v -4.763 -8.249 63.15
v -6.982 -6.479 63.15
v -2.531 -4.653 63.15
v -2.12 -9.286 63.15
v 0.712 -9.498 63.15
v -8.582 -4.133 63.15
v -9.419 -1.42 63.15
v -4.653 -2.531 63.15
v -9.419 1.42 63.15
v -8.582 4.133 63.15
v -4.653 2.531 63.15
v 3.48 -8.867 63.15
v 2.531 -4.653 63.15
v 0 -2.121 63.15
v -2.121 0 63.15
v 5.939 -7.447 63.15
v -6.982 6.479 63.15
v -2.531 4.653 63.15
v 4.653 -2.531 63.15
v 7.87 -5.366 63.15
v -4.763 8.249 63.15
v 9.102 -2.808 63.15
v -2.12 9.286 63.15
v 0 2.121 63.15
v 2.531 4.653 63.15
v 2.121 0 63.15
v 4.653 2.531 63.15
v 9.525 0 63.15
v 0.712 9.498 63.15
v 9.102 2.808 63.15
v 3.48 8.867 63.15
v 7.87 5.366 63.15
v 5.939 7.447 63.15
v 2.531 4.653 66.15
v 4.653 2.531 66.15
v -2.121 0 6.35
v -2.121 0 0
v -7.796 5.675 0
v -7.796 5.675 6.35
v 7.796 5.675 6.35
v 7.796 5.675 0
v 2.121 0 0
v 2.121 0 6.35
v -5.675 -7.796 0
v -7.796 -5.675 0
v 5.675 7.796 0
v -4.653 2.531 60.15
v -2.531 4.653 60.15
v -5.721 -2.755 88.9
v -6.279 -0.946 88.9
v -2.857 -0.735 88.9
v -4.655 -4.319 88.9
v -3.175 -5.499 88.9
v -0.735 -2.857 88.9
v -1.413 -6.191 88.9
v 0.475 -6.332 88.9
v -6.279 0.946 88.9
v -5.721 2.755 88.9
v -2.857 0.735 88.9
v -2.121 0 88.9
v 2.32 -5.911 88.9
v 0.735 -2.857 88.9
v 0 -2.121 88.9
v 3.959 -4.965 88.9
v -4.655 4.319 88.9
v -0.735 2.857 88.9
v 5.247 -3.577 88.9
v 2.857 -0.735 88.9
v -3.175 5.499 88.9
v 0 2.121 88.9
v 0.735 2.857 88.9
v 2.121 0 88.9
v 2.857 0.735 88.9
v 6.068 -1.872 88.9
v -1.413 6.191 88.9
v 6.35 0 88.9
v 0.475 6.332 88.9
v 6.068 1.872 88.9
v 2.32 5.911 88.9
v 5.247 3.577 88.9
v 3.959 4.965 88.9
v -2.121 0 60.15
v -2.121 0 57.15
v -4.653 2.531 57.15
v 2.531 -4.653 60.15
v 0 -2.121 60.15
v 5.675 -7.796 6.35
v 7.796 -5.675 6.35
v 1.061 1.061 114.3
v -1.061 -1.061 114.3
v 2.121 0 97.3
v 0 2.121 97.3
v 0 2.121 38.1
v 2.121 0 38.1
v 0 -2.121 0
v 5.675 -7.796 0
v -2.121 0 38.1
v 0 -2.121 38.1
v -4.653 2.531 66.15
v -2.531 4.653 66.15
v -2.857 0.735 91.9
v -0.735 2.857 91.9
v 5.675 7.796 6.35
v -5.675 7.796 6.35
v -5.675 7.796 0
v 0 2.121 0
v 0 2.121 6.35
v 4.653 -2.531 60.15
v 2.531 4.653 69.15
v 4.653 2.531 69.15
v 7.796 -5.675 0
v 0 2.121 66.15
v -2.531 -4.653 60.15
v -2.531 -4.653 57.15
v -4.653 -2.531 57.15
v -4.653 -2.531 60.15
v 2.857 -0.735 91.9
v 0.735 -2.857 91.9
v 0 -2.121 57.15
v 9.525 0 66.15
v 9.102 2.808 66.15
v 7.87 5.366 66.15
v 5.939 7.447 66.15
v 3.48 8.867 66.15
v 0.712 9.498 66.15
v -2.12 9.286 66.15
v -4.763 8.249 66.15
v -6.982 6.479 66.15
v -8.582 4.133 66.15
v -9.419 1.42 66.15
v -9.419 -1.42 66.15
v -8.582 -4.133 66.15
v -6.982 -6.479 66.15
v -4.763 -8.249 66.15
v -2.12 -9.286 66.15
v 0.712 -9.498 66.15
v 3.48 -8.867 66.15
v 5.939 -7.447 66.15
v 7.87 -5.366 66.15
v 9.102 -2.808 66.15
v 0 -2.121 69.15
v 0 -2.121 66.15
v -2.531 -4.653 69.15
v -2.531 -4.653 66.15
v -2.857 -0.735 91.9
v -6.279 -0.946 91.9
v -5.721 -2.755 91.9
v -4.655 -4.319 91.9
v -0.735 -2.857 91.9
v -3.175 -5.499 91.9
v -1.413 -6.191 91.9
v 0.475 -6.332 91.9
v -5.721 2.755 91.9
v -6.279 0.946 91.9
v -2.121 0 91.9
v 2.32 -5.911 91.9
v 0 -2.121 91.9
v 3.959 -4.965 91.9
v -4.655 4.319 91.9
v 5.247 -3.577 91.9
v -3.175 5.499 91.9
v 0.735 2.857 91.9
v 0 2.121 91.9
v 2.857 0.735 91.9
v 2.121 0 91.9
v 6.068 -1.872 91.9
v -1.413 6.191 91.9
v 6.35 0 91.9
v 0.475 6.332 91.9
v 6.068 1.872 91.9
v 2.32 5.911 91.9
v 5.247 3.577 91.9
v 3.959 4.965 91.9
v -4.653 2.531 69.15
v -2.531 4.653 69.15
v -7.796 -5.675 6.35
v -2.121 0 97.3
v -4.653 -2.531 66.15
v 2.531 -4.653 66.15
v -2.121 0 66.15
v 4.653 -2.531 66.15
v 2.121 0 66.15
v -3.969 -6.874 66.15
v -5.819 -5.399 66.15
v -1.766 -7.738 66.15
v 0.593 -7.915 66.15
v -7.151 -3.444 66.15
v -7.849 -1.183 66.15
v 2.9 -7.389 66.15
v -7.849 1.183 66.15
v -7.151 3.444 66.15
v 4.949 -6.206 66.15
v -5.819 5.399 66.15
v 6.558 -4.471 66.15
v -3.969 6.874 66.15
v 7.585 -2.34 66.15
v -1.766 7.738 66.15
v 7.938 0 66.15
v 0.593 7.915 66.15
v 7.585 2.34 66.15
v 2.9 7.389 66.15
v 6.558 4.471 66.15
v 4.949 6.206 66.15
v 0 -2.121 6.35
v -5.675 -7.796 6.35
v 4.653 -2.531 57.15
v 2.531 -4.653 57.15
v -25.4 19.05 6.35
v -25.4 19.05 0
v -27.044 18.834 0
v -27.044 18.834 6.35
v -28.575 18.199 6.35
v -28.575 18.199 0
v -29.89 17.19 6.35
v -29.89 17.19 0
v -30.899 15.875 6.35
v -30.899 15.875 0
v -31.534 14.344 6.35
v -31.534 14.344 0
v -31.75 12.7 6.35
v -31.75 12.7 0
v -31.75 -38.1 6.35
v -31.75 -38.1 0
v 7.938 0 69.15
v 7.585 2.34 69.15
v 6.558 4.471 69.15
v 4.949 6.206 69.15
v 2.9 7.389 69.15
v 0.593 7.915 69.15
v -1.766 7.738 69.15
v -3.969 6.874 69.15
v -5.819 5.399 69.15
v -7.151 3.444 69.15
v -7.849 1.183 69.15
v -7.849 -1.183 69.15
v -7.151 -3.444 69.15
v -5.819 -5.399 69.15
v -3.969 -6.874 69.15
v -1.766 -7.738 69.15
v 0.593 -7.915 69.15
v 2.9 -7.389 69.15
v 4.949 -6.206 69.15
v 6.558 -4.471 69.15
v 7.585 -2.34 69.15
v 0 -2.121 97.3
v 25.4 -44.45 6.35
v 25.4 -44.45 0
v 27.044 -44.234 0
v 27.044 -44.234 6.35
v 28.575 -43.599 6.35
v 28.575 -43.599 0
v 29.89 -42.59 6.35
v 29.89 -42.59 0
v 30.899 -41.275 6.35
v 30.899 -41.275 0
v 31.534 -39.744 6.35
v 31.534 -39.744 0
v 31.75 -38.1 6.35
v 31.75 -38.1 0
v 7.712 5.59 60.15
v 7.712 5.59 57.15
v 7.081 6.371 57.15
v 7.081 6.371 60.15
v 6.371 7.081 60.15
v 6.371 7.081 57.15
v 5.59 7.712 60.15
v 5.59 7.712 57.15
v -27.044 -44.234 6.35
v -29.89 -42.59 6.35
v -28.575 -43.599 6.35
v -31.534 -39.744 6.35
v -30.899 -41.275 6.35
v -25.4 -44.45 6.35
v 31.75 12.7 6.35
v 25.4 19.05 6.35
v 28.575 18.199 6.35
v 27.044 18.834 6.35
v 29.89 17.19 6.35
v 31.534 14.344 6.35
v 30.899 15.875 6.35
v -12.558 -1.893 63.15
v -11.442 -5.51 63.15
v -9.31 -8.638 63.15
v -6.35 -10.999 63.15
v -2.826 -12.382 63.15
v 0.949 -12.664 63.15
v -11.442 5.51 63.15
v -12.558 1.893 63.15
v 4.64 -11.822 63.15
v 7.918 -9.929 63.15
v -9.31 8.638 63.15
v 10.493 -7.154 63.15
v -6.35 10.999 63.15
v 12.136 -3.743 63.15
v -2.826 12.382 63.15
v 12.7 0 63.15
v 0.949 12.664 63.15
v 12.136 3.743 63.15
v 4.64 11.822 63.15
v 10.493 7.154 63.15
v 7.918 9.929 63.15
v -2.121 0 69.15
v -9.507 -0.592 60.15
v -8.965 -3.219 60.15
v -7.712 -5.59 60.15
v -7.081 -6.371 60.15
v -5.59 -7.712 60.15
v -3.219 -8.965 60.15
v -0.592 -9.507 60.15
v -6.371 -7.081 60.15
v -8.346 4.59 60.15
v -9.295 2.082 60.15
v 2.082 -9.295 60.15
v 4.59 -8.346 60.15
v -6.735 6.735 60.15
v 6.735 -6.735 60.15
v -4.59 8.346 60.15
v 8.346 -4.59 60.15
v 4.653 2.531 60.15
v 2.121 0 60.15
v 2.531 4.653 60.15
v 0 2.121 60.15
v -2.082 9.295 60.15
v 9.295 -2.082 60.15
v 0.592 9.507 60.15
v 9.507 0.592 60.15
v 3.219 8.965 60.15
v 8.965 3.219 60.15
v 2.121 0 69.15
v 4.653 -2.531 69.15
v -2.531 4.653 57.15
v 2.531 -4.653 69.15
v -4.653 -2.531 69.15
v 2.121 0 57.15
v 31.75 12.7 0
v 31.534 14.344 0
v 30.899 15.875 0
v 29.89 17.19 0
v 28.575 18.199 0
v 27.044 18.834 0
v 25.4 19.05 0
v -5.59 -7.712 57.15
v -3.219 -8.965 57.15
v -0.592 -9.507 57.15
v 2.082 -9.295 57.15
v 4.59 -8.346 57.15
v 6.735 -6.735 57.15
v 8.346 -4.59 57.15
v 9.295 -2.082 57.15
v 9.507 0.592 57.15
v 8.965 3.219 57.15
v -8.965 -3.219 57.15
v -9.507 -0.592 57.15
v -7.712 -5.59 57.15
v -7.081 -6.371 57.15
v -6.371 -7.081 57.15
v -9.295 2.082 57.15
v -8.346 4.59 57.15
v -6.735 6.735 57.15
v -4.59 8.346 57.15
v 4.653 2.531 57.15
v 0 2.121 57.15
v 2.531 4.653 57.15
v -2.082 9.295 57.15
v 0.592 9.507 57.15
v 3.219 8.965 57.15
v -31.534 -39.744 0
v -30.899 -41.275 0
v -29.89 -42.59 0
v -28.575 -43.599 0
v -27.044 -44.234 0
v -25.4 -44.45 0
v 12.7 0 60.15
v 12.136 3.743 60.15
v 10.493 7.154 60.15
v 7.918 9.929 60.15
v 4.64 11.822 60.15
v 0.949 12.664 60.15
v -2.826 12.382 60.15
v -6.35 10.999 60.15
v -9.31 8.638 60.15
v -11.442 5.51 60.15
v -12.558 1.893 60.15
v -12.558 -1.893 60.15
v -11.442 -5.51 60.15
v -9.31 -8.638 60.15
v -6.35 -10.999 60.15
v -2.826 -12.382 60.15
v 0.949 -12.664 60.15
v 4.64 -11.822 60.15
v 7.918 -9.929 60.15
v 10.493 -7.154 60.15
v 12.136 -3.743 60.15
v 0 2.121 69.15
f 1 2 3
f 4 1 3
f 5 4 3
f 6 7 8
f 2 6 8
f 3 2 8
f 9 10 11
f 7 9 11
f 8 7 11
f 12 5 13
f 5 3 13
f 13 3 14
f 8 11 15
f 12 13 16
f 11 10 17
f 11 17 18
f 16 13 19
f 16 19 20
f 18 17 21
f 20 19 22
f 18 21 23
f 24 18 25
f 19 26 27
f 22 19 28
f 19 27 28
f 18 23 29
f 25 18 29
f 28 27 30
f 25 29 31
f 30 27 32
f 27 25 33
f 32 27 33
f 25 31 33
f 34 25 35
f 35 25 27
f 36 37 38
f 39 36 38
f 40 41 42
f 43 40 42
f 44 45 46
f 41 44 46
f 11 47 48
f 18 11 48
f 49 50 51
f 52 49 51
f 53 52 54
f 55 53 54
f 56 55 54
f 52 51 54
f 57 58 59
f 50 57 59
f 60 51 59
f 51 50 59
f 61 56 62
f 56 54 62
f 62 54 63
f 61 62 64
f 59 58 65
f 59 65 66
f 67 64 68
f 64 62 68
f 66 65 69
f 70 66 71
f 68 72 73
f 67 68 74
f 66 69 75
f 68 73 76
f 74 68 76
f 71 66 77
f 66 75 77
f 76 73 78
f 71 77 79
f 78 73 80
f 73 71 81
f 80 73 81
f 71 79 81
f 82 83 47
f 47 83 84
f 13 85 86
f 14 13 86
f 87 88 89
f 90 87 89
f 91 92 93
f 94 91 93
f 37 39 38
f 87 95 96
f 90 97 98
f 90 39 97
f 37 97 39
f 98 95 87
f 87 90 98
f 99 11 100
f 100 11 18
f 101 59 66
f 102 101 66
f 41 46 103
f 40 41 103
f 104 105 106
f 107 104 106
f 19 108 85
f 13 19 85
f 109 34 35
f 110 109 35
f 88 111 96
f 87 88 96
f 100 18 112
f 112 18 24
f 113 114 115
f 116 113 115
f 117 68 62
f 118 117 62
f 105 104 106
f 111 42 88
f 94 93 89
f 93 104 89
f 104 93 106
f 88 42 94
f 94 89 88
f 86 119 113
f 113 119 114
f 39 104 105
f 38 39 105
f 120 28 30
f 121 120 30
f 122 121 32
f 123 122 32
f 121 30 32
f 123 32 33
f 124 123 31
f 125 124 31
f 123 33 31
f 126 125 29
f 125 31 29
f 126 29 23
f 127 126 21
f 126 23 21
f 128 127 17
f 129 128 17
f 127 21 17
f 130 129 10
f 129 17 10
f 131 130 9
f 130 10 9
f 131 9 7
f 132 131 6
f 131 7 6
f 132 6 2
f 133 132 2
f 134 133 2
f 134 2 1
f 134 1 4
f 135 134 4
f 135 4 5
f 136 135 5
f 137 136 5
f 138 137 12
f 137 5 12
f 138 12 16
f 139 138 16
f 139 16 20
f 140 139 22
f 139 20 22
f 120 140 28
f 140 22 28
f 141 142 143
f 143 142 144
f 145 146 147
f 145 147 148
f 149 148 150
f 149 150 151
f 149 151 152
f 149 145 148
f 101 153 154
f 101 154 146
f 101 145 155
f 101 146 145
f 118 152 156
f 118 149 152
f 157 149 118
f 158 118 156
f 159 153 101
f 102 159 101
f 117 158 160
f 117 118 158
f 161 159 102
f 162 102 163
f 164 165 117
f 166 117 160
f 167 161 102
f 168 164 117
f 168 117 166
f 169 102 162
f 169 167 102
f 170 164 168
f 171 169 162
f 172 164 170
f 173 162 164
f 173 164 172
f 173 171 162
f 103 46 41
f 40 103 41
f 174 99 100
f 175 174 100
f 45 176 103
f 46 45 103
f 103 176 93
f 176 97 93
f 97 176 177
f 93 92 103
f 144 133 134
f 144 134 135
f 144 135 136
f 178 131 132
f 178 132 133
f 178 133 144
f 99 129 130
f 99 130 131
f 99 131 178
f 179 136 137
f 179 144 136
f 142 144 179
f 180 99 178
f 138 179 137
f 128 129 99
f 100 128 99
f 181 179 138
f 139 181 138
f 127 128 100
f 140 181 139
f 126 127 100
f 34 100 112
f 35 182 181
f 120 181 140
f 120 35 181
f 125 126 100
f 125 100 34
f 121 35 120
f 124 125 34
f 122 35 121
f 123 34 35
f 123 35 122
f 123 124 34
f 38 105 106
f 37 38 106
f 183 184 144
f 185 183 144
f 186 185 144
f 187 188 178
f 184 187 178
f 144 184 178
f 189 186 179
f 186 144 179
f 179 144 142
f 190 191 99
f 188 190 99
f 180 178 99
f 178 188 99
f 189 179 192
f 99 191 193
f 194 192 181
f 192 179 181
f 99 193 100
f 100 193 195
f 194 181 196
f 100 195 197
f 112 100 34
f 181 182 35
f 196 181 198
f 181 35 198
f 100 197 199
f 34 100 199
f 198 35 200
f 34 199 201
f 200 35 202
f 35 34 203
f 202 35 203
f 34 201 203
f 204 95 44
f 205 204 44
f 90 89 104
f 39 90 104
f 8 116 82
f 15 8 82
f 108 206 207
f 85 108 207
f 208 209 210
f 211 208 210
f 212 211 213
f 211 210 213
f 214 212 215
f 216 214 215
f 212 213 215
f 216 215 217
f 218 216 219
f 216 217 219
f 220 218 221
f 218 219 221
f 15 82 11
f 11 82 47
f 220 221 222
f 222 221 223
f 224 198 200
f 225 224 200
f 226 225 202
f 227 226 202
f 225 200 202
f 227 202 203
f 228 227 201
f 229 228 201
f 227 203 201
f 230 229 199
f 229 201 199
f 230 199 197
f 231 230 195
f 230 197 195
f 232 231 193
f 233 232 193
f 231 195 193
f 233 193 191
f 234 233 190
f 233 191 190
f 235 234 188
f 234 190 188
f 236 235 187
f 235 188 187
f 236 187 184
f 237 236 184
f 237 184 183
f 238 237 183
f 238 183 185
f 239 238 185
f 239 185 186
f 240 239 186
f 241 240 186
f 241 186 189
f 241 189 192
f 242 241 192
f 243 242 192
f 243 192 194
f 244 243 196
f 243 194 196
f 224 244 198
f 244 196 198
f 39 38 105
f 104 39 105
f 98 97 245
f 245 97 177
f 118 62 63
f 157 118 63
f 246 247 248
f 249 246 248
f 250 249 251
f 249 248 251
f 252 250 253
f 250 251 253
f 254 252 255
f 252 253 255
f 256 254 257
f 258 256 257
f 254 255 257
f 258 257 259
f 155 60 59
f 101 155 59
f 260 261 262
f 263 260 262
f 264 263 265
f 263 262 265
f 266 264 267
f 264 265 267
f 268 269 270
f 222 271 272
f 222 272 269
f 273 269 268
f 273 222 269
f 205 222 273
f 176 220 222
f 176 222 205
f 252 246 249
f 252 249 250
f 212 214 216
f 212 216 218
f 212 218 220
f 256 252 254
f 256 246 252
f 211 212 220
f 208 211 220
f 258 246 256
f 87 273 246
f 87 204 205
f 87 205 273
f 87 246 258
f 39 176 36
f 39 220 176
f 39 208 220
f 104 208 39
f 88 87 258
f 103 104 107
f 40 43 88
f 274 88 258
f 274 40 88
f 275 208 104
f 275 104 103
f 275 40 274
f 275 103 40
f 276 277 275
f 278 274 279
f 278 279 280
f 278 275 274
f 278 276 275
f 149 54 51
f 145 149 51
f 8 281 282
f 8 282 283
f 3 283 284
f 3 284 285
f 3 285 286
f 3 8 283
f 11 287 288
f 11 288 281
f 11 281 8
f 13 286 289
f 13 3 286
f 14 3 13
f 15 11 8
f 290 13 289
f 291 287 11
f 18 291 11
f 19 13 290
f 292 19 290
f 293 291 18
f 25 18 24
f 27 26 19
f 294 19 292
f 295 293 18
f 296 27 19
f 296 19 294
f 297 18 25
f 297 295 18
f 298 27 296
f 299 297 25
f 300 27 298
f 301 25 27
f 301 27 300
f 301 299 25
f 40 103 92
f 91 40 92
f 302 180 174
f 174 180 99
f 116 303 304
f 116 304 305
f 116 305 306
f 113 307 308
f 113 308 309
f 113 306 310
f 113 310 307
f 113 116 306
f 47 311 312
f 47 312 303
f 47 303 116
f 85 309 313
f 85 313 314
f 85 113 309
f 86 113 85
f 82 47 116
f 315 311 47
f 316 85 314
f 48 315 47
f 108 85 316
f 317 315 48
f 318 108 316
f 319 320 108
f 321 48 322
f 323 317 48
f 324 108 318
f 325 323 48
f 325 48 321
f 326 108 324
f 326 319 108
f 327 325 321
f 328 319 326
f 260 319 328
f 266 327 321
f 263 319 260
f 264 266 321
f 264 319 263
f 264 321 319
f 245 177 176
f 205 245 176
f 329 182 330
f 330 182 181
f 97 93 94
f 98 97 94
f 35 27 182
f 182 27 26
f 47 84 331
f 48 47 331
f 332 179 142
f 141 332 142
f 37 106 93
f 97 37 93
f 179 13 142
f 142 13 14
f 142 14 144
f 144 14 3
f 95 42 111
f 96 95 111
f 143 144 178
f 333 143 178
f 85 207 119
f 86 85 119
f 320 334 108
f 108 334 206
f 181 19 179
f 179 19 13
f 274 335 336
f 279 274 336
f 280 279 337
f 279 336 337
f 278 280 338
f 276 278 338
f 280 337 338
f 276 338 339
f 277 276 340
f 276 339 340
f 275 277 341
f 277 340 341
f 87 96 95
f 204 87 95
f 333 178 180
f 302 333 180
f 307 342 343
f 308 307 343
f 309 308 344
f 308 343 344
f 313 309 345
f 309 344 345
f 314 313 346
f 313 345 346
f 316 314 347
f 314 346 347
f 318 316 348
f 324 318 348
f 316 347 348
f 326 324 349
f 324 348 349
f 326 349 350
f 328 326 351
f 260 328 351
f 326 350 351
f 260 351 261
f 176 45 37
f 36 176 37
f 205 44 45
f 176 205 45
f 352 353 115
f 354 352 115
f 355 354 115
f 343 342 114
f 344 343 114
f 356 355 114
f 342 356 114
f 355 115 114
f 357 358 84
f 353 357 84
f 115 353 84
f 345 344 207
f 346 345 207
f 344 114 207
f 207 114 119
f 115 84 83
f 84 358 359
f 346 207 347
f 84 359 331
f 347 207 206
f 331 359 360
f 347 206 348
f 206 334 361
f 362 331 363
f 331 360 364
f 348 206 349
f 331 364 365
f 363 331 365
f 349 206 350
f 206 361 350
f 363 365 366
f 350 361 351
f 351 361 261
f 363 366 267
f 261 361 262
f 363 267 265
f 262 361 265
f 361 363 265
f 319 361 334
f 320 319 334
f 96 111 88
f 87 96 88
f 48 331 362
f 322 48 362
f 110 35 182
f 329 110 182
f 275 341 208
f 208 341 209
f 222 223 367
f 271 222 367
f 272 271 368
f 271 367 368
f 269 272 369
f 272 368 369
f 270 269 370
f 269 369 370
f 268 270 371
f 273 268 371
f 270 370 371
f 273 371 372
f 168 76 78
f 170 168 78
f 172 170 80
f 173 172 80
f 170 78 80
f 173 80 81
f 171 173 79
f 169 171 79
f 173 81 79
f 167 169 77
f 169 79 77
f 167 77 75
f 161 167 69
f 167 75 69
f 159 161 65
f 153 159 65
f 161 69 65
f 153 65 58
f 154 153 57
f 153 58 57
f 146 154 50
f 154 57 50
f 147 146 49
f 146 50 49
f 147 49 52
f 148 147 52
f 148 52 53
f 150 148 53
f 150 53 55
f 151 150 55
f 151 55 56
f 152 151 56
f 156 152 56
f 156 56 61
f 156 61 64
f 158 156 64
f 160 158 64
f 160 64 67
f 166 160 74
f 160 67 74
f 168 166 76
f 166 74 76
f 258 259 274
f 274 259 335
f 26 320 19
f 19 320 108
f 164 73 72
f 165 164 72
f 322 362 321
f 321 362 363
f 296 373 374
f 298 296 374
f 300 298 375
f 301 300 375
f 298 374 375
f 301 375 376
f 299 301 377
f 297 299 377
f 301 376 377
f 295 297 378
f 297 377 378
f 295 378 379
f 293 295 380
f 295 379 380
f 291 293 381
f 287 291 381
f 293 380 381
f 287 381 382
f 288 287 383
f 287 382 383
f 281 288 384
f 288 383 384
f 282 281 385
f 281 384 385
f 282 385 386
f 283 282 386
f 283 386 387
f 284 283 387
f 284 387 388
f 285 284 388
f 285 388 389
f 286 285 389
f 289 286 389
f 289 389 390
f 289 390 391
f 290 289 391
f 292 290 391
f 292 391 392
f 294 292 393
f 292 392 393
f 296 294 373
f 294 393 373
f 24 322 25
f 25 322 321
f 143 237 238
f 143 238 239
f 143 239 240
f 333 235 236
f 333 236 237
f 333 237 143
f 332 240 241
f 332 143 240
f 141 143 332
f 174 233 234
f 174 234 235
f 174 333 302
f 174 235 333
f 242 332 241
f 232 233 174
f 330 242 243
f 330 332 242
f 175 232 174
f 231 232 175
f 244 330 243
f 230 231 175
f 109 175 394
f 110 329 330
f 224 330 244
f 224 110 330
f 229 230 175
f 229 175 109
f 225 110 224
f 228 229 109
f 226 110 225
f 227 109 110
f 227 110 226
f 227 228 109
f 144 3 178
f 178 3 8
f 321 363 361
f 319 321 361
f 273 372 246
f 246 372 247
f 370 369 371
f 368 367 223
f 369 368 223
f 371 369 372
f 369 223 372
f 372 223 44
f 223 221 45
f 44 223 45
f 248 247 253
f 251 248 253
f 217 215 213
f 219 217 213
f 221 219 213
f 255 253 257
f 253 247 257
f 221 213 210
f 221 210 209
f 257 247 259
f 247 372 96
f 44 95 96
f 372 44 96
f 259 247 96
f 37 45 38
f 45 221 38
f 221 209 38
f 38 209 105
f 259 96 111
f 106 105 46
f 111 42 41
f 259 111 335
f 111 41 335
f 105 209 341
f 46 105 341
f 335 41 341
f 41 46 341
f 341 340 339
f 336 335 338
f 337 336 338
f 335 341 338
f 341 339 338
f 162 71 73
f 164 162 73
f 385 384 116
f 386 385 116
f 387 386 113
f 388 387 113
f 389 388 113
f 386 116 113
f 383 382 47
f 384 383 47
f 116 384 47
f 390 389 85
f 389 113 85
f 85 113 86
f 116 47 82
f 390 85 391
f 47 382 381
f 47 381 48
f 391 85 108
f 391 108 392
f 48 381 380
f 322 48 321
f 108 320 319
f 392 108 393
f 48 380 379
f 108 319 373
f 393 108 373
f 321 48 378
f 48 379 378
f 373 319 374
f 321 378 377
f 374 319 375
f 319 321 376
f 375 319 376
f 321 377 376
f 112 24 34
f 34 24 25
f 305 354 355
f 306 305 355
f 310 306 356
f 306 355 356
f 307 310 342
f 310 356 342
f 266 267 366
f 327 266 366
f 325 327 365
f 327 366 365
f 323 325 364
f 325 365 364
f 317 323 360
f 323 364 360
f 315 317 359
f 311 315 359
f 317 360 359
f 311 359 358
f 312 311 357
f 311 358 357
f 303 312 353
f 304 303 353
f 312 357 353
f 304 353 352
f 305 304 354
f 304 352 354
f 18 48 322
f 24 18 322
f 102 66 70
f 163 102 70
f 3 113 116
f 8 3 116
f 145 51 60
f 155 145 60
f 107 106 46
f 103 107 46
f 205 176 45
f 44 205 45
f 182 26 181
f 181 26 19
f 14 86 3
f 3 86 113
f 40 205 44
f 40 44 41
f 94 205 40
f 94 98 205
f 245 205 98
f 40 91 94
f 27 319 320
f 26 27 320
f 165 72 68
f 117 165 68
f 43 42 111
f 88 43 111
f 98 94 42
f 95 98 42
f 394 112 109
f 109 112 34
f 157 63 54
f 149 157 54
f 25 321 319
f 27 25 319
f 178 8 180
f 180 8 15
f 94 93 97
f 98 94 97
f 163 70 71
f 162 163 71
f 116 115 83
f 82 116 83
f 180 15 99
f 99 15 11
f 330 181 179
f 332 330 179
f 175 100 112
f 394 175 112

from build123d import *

# Parameters (mm, degrees)
F1_DEPTH  = 6.35
F3_DEPTH  = 3
F5_DEPTH  = 3
F9_DEPTH  = 3
F10_R     = 12.7
F10_R_2   = 9.525
F11_DEPTH = 3
F12_R     = 9.525
F13_DEPTH = 3
F14_R     = 7.9375
F15_DEPTH = 3
F16_R     = 6.35
F17_DEPTH = 3


with BuildPart() as f1:
    # F0 (on Top) → F1 (new body)
    with BuildSketch(Plane.XY):
        with BuildLine():
            ThreePointArc((31.75, 12.7), (29.8901280605, 17.1901280605), (25.4, 19.05))
            Line((25.4, 19.05), (-25.4, 19.05))
            ThreePointArc((-25.4, 19.05), (-29.8901280605, 17.1901280605), (-31.75, 12.7))
            Line((-31.75, 12.7), (-31.75, -38.1))
            ThreePointArc((-31.75, -38.1), (-29.8901280605, -42.5901280605), (-25.4, -44.45))
            Line((-25.4, -44.45), (25.4, -44.45))
            ThreePointArc((25.4, -44.45), (29.8901280605, -42.5901280605), (31.75, -38.1))
            Line((31.75, -38.1), (31.75, 12.7))
        make_face()
        Polygon((-2.1213203436, 0), (-7.7958522626, 5.674531919), (-5.674531919, 7.7958522626), (0, 2.1213203436), (5.674531919, 7.7958522626), (7.7958522626, 5.674531919), (2.1213203436, 0), (7.7958522626, -5.674531919), (5.674531919, -7.7958522626), (0, -2.1213203436), (-5.674531919, -7.7958522626), (-7.7958522626, -5.674531919), align=None, mode=Mode.SUBTRACT)
    extrude(amount=F1_DEPTH)


with BuildPart() as f3:
    # F2 (on face) → F3 (new body)
    with BuildSketch(Plane(origin=(1.0606601718, 1.0606601718, 0), x_dir=(0.7071067812, -0.7071067812, 0), z_dir=(-0.7071067812, -0.7071067812, 0))):
        Polygon((0, 114.3), (-9.525, 6.35), (-9.525, 0), (-1.5, 0), (-1.5, 6.35), (-1.5, 38.1), (1.5, 38.1), (1.5, 6.35), (1.5, 0), (9.525, 0), (9.525, 6.35), align=None)
    extrude(amount=F3_DEPTH)


with BuildPart() as f5:
    # F4 (on face) → F5 (new body)
    with BuildSketch(Plane(origin=(-1.0606601718, 1.0606601718, 0), x_dir=(0.7071067812, 0.7071067812, 0), z_dir=(0.7071067812, -0.7071067812, 0))):
        Polygon((-1.5, 97.3), (-9.525, 6.35), (-9.525, 0), (9.525, 0), (9.525, 6.35), (1.5, 97.3), (1.5, 38.1), (-1.5, 38.1), align=None)
    extrude(amount=F5_DEPTH)


with BuildPart() as f9:
    # F8 (on offset) → F9 (new body)
    with BuildSketch(Plane.XY.offset(57.15)):
        with BuildLine():
            ThreePointArc((-5.5904910444, -7.7118113879), (4.3287525803, -8.4845463107), (9.525, 0))
            ThreePointArc((9.525, 0), (9.0603705352, 2.938589928), (7.7118113879, 5.5904910444))
            ThreePointArc((7.7118113879, 5.5904910444), (6.7351920908, 6.7351920908), (5.5904910444, 7.7118113879))
            ThreePointArc((5.5904910444, 7.7118113879), (-6.7351920908, 6.7351920908), (-7.7118113879, -5.5904910444))
            ThreePointArc((-7.7118113879, -5.5904910444), (-6.7351920908, -6.7351920908), (-5.5904910444, -7.7118113879))
        make_face()
        Polygon((-4.6527626202, 2.5314422766), (-2.5314422766, 4.6527626202), (0, 2.1213203436), (2.5314422766, 4.6527626202), (4.6527626202, 2.5314422766), (2.1213203436, 0), (4.6527626202, -2.5314422766), (2.5314422766, -4.6527626202), (0, -2.1213203436), (-2.5314422766, -4.6527626202), (-4.6527626202, -2.5314422766), (-2.1213203436, 0), align=None, mode=Mode.SUBTRACT)
    extrude(amount=F9_DEPTH)


with BuildPart() as f11:
    # F10 (on face) → F11 (new body)
    with BuildSketch(Plane.XY.offset(60.15)):
        Circle(F10_R)
        Circle(F10_R_2, mode=Mode.SUBTRACT)
        Circle(F10_R_2)
        Polygon((-4.6527626202, -2.5314422766), (-2.1213203436, 0), (-4.6527626202, 2.5314422766), (-2.5314422766, 4.6527626202), (0, 2.1213203436), (2.5314422766, 4.6527626202), (4.6527626202, 2.5314422766), (2.1213203436, 0), (4.6527626202, -2.5314422766), (2.5314422766, -4.6527626202), (0, -2.1213203436), (-2.5314422766, -4.6527626202), align=None, mode=Mode.SUBTRACT)
    extrude(amount=F11_DEPTH)


with BuildPart() as f13:
    # F12 (on face) → F13 (new body)
    with BuildSketch(Plane.XY.offset(63.15)):
        Circle(F12_R)
        Polygon((2.5314422766, 4.6527626202), (4.6527626202, 2.5314422766), (2.1213203436, 0), (4.6527626202, -2.5314422766), (2.5314422766, -4.6527626202), (0, -2.1213203436), (-2.5314422766, -4.6527626202), (-4.6527626202, -2.5314422766), (-2.1213203436, 0), (-4.6527626202, 2.5314422766), (-2.5314422766, 4.6527626202), (0, 2.1213203436), align=None, mode=Mode.SUBTRACT)
    extrude(amount=F13_DEPTH)


with BuildPart() as f15:
    # F14 (on face) → F15 (new body)
    with BuildSketch(Plane.XY.offset(66.15)):
        Circle(F14_R)
        Polygon((-4.6527626202, -2.5314422766), (-2.1213203436, 0), (-4.6527626202, 2.5314422766), (-2.5314422766, 4.6527626202), (0, 2.1213203436), (2.5314422766, 4.6527626202), (4.6527626202, 2.5314422766), (2.1213203436, 0), (4.6527626202, -2.5314422766), (2.5314422766, -4.6527626202), (0, -2.1213203436), (-2.5314422766, -4.6527626202), align=None, mode=Mode.SUBTRACT)
    extrude(amount=F15_DEPTH)


with BuildPart() as f17:
    # F16 (on offset) → F17 (new body)
    with BuildSketch(Plane.XY.offset(88.9)):
        Circle(F16_R)
        Polygon((-2.856711396, 0.7353910524), (-0.7353910524, 2.856711396), (0, 2.1213203436), (0.7353910524, 2.856711396), (2.856711396, 0.7353910524), (2.1213203436, 0), (2.856711396, -0.7353910524), (0.7353910524, -2.856711396), (0, -2.1213203436), (-0.7353910524, -2.856711396), (-2.856711396, -0.7353910524), (-2.1213203436, 0), align=None, mode=Mode.SUBTRACT)
    extrude(amount=F17_DEPTH)


solid = Compound([f1.part, f3.part, f5.part, f9.part, f11.part, f13.part, f15.part, f17.part])
